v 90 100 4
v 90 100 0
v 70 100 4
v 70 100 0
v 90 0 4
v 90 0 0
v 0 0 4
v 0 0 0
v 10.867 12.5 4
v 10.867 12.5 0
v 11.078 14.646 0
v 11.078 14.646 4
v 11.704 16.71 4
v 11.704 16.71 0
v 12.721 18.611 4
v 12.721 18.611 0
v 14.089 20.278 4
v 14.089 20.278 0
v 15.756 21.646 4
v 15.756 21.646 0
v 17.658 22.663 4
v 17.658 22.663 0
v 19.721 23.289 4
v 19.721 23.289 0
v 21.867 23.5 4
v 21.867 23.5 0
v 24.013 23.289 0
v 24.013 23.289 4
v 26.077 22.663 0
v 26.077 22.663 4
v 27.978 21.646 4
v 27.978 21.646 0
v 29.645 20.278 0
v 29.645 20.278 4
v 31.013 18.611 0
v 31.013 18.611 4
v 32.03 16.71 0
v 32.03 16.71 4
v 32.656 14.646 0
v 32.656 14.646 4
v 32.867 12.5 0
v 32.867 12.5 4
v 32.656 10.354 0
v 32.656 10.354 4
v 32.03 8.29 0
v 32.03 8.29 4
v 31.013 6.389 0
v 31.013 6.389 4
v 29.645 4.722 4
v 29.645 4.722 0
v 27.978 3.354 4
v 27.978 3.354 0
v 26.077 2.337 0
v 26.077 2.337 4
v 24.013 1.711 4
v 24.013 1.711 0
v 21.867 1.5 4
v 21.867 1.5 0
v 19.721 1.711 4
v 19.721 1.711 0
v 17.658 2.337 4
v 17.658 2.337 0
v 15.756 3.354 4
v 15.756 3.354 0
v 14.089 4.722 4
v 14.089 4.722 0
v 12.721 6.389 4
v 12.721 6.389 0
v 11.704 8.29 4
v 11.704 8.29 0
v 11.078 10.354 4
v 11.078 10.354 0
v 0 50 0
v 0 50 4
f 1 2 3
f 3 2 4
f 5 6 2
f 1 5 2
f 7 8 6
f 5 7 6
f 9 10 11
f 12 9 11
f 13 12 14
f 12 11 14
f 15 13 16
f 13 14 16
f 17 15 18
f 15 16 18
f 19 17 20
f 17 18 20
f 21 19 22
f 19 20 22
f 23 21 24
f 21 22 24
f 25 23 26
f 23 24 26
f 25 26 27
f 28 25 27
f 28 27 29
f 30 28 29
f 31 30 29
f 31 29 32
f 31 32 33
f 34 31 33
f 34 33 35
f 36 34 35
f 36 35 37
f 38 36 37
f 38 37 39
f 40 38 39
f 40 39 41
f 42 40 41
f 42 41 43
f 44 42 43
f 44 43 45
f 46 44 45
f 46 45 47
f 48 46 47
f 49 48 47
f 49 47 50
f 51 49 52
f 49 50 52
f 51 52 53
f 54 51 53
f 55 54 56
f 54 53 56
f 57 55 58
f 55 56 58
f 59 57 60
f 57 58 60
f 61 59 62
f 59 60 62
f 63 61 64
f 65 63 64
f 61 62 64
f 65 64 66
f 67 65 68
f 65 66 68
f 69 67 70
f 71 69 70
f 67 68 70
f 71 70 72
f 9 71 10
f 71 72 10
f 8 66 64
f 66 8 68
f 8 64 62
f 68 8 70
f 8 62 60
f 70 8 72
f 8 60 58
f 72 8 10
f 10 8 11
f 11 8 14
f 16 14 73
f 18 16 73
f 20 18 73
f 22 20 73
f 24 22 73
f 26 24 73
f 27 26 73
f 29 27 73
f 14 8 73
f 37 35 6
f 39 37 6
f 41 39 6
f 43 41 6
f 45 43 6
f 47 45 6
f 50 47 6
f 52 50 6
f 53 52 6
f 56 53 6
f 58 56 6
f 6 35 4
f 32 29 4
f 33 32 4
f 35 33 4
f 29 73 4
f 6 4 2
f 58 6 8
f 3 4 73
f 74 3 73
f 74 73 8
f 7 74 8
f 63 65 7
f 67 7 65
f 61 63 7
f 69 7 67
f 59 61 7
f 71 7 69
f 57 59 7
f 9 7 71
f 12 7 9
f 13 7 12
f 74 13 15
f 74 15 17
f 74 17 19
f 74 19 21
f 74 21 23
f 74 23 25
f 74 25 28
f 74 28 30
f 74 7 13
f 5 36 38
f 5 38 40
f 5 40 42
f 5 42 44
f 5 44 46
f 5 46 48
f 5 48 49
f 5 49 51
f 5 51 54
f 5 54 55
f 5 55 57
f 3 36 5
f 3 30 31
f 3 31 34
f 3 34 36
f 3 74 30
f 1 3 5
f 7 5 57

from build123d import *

# Parameters (mm, degrees)
BOSS_EXTRUDE1_DEPTH = 4
SKETCH2_R           = 11
CUT_EXTRUDE1_DEPTH  = 135.595690867


with BuildPart() as part:
    # Sketch1 → Boss-Extrude1 (new body)
    with BuildSketch(Plane.XY):
        Polygon((0, 0), (90, 0), (90, 100), (70, 100), (0, 50), align=None)
    extrude(amount=BOSS_EXTRUDE1_DEPTH)

    # Sketch2 → Cut-Extrude1 (cut, through all)
    with BuildSketch(Plane(origin=(0, 0, 0), x_dir=(-1, 0, 0), z_dir=(0, 0, -1))):
        with Locations((-21.867101934, 12.5)):
            Circle(SKETCH2_R)
    extrude(amount=-CUT_EXTRUDE1_DEPTH, mode=Mode.SUBTRACT)


solid = part.part
